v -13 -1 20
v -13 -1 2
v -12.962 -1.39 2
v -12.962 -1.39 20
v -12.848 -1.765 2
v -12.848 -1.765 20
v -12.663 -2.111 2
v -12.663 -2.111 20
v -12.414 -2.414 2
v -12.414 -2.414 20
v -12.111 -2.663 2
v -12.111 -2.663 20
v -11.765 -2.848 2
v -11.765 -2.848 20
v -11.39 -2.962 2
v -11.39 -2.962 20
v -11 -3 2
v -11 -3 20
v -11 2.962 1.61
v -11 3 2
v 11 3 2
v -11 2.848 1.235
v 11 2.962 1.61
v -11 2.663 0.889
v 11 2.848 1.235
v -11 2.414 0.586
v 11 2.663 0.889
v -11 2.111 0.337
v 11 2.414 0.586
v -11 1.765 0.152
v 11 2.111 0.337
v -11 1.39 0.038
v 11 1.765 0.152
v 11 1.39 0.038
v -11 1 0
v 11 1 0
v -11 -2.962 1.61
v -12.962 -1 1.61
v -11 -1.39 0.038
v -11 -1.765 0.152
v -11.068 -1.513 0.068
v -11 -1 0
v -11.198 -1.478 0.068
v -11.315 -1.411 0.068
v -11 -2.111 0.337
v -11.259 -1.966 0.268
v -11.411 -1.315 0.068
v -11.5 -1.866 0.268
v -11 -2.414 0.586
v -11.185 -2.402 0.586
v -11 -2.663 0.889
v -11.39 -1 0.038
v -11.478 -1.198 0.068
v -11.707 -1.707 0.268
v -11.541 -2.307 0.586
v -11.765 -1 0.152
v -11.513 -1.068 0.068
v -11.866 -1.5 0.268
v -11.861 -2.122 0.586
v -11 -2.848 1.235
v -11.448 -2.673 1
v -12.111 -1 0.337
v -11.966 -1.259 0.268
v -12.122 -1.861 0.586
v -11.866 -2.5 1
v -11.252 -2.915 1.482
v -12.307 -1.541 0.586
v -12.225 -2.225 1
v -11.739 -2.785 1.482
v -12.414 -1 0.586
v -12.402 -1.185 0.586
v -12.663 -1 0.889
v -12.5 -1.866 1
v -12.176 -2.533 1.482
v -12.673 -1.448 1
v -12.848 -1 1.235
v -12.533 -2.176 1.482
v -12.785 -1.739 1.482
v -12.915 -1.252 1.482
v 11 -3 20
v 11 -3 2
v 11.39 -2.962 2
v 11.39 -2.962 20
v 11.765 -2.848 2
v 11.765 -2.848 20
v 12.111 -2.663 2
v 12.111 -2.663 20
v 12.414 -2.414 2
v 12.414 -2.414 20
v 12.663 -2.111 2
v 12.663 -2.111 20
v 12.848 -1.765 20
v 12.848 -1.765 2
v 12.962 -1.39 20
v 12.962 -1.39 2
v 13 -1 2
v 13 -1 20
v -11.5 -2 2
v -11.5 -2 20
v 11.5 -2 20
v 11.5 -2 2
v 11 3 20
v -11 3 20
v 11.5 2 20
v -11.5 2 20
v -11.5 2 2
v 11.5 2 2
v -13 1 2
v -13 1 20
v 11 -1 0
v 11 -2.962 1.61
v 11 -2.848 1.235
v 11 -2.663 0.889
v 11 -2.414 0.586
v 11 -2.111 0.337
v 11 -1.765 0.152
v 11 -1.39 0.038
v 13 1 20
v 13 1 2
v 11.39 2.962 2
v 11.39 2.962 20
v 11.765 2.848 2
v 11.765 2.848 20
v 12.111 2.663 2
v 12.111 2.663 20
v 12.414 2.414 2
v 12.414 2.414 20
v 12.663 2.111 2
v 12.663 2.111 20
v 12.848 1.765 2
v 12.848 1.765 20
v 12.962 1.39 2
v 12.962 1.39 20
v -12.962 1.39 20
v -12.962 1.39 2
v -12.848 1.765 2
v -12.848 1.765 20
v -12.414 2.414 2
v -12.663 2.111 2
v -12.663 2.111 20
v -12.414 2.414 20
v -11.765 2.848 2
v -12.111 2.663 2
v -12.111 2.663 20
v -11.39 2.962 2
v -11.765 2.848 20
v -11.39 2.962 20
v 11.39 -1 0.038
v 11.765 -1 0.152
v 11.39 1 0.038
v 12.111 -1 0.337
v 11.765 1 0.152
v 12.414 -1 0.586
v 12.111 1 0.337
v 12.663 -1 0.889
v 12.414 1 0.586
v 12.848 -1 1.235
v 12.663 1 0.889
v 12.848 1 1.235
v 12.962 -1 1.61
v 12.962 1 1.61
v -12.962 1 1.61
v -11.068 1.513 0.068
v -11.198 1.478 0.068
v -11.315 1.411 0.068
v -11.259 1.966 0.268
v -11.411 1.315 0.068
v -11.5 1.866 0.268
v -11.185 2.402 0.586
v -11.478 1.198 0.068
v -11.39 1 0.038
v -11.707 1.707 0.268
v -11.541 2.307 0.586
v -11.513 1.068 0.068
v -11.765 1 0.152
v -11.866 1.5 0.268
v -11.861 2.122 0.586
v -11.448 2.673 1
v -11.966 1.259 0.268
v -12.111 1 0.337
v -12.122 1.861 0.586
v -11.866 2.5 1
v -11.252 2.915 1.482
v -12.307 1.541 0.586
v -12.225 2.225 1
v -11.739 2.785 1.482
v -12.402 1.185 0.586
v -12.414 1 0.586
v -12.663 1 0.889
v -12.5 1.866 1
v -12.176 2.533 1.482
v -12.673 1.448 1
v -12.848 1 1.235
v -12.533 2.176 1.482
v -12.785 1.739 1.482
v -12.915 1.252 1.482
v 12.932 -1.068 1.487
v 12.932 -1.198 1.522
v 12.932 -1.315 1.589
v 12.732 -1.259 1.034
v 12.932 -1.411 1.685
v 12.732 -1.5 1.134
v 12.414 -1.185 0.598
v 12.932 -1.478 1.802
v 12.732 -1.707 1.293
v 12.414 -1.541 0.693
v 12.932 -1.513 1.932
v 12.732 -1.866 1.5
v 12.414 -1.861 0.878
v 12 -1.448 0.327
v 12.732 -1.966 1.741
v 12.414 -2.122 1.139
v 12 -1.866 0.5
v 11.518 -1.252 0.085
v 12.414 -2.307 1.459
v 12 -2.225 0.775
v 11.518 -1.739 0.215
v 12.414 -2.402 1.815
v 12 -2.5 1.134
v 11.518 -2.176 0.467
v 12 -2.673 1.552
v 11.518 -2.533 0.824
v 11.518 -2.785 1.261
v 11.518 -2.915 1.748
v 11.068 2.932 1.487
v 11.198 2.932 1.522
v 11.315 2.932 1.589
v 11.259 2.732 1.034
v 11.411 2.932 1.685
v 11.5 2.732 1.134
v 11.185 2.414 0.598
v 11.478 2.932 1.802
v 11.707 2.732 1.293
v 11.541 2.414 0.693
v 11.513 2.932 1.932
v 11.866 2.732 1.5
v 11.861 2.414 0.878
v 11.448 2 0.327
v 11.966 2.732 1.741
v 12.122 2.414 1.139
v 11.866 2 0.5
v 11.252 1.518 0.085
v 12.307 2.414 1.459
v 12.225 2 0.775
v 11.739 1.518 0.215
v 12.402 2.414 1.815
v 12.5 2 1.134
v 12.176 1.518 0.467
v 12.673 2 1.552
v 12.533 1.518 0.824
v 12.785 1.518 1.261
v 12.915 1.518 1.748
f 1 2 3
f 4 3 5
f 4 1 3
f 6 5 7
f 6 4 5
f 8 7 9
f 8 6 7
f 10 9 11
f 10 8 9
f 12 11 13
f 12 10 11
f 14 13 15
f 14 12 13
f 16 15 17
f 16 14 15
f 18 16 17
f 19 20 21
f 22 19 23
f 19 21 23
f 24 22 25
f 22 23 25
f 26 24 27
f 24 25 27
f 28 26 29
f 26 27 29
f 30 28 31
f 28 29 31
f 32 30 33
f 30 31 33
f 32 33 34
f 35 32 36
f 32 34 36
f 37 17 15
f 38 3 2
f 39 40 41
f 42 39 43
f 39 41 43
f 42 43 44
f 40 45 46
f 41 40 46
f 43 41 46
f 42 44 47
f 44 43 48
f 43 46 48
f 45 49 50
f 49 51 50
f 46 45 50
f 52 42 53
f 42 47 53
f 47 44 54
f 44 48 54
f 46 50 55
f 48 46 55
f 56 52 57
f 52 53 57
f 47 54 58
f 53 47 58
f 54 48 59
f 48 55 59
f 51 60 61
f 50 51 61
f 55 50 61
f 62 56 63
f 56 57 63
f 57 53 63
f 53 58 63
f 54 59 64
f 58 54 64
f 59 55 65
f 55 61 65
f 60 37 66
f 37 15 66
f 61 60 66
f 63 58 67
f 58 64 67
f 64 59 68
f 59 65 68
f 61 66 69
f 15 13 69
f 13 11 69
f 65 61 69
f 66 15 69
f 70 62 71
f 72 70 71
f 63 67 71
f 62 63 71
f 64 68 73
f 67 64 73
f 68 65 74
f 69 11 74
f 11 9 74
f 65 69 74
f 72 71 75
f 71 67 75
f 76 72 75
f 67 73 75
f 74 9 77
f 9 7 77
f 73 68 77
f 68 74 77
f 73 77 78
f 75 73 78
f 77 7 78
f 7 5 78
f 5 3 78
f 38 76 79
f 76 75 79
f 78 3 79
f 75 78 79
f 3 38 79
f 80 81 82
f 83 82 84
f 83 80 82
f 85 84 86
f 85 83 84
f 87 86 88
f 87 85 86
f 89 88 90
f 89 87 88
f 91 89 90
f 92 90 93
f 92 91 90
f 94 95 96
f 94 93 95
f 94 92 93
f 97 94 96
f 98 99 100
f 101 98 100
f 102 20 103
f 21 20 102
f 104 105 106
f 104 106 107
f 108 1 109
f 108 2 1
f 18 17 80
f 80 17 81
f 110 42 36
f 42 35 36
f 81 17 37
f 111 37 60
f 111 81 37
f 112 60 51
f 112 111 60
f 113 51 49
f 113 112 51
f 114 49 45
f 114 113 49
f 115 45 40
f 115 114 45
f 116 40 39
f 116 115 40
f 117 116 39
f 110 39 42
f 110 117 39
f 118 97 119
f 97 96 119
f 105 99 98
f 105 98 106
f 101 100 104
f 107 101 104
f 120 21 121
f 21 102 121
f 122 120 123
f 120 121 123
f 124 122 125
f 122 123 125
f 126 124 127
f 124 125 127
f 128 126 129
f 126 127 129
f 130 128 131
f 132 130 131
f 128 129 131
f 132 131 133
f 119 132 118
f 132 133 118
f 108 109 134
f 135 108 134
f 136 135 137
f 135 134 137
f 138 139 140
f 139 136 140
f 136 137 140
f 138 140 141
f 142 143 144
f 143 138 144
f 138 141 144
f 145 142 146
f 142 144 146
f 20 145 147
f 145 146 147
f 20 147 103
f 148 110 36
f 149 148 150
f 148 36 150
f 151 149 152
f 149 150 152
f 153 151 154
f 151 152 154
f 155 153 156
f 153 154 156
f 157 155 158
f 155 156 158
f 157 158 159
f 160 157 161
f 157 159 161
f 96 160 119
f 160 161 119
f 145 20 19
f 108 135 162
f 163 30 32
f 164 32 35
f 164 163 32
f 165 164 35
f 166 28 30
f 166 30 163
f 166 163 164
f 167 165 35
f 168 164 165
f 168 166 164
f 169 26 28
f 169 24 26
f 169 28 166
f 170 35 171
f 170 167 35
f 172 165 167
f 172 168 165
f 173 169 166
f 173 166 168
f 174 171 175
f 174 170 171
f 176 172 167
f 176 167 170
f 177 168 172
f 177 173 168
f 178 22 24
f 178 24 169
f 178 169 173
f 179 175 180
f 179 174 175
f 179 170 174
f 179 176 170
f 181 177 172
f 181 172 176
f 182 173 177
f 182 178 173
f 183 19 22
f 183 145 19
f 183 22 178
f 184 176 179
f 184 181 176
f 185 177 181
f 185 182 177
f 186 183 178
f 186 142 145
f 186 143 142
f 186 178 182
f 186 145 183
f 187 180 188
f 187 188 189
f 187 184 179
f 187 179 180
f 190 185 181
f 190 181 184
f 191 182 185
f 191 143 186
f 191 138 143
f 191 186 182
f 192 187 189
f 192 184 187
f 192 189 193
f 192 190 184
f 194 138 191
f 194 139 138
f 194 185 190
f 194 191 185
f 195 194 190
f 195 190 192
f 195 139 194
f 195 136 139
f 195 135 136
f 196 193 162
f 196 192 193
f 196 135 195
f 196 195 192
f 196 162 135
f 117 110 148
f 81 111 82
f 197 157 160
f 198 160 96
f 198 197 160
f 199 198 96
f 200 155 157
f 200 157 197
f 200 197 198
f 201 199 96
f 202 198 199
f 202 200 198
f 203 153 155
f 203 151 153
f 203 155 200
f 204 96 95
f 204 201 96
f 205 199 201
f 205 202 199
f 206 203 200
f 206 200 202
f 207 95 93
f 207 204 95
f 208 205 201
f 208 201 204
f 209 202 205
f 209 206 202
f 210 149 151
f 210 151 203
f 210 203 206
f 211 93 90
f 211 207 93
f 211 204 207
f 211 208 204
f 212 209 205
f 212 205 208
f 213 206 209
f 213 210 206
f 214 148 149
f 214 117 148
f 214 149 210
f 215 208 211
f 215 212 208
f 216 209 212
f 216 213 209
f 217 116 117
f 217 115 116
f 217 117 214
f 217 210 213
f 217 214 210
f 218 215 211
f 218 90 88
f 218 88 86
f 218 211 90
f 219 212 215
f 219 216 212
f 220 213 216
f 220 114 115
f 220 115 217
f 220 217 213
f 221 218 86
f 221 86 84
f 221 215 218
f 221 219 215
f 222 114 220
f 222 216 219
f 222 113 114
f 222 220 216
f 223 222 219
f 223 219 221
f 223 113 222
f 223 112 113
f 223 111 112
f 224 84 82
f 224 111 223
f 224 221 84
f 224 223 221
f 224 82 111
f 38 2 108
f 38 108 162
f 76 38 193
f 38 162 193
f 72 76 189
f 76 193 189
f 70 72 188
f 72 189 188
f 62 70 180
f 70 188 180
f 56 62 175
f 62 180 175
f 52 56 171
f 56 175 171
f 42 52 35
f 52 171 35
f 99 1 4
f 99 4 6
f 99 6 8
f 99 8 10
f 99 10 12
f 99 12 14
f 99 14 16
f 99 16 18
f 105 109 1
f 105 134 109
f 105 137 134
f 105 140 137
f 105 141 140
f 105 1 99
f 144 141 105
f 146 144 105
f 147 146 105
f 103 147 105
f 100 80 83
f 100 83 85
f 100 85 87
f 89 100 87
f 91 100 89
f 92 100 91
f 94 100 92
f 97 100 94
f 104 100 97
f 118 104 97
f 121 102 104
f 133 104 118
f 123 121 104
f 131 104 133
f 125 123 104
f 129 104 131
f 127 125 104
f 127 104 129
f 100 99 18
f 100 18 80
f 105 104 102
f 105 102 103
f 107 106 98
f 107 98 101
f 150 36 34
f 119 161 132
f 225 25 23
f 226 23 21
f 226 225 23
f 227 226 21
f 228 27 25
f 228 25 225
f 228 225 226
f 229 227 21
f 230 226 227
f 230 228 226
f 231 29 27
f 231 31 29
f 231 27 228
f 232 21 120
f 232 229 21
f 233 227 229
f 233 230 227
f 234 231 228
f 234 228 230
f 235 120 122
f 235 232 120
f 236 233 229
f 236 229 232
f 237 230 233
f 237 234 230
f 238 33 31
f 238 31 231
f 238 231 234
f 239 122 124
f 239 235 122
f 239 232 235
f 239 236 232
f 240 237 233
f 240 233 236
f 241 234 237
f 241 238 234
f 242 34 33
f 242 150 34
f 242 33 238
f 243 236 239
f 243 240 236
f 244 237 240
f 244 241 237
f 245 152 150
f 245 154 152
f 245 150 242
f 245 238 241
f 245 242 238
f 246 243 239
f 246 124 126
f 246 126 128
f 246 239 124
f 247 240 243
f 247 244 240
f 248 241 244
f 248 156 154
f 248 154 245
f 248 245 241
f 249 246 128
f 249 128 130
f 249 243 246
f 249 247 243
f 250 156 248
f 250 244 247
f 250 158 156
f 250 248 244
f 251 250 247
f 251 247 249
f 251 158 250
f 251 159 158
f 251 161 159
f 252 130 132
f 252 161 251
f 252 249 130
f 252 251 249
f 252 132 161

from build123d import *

# Parameters (mm, degrees)
F0_W     = 26
F0_H     = 6
F1_DEPTH = 20
F2_W     = 23
F2_H     = 4
F3_DEPTH = 18
F4_R     = 2


with BuildPart() as f1:
    # F0 (on Top) → F1 (new body)
    with BuildSketch(Plane.XY):
        Rectangle(F0_W, F0_H)
    extrude(amount=F1_DEPTH)

    # F2 (on face) → F3 (cut)
    with BuildSketch(Plane.XY.offset(20)):
        Rectangle(F2_W, F2_H)
    extrude(amount=-F3_DEPTH, mode=Mode.SUBTRACT)

    # F4
    f4_edges = [f1.edges().sort_by_distance(p)[0] for p in [
        (-13, 3, 10),
        (-13, -3, 10),
        (0, -3, 0),
        (13, 0, 0),
        (0, 3, 0),
        (-13, 0, 0),
        (13, -3, 10),
        (13, 3, 10),
    ]]
    fillet(f4_edges, radius=F4_R)


solid = f1.part
